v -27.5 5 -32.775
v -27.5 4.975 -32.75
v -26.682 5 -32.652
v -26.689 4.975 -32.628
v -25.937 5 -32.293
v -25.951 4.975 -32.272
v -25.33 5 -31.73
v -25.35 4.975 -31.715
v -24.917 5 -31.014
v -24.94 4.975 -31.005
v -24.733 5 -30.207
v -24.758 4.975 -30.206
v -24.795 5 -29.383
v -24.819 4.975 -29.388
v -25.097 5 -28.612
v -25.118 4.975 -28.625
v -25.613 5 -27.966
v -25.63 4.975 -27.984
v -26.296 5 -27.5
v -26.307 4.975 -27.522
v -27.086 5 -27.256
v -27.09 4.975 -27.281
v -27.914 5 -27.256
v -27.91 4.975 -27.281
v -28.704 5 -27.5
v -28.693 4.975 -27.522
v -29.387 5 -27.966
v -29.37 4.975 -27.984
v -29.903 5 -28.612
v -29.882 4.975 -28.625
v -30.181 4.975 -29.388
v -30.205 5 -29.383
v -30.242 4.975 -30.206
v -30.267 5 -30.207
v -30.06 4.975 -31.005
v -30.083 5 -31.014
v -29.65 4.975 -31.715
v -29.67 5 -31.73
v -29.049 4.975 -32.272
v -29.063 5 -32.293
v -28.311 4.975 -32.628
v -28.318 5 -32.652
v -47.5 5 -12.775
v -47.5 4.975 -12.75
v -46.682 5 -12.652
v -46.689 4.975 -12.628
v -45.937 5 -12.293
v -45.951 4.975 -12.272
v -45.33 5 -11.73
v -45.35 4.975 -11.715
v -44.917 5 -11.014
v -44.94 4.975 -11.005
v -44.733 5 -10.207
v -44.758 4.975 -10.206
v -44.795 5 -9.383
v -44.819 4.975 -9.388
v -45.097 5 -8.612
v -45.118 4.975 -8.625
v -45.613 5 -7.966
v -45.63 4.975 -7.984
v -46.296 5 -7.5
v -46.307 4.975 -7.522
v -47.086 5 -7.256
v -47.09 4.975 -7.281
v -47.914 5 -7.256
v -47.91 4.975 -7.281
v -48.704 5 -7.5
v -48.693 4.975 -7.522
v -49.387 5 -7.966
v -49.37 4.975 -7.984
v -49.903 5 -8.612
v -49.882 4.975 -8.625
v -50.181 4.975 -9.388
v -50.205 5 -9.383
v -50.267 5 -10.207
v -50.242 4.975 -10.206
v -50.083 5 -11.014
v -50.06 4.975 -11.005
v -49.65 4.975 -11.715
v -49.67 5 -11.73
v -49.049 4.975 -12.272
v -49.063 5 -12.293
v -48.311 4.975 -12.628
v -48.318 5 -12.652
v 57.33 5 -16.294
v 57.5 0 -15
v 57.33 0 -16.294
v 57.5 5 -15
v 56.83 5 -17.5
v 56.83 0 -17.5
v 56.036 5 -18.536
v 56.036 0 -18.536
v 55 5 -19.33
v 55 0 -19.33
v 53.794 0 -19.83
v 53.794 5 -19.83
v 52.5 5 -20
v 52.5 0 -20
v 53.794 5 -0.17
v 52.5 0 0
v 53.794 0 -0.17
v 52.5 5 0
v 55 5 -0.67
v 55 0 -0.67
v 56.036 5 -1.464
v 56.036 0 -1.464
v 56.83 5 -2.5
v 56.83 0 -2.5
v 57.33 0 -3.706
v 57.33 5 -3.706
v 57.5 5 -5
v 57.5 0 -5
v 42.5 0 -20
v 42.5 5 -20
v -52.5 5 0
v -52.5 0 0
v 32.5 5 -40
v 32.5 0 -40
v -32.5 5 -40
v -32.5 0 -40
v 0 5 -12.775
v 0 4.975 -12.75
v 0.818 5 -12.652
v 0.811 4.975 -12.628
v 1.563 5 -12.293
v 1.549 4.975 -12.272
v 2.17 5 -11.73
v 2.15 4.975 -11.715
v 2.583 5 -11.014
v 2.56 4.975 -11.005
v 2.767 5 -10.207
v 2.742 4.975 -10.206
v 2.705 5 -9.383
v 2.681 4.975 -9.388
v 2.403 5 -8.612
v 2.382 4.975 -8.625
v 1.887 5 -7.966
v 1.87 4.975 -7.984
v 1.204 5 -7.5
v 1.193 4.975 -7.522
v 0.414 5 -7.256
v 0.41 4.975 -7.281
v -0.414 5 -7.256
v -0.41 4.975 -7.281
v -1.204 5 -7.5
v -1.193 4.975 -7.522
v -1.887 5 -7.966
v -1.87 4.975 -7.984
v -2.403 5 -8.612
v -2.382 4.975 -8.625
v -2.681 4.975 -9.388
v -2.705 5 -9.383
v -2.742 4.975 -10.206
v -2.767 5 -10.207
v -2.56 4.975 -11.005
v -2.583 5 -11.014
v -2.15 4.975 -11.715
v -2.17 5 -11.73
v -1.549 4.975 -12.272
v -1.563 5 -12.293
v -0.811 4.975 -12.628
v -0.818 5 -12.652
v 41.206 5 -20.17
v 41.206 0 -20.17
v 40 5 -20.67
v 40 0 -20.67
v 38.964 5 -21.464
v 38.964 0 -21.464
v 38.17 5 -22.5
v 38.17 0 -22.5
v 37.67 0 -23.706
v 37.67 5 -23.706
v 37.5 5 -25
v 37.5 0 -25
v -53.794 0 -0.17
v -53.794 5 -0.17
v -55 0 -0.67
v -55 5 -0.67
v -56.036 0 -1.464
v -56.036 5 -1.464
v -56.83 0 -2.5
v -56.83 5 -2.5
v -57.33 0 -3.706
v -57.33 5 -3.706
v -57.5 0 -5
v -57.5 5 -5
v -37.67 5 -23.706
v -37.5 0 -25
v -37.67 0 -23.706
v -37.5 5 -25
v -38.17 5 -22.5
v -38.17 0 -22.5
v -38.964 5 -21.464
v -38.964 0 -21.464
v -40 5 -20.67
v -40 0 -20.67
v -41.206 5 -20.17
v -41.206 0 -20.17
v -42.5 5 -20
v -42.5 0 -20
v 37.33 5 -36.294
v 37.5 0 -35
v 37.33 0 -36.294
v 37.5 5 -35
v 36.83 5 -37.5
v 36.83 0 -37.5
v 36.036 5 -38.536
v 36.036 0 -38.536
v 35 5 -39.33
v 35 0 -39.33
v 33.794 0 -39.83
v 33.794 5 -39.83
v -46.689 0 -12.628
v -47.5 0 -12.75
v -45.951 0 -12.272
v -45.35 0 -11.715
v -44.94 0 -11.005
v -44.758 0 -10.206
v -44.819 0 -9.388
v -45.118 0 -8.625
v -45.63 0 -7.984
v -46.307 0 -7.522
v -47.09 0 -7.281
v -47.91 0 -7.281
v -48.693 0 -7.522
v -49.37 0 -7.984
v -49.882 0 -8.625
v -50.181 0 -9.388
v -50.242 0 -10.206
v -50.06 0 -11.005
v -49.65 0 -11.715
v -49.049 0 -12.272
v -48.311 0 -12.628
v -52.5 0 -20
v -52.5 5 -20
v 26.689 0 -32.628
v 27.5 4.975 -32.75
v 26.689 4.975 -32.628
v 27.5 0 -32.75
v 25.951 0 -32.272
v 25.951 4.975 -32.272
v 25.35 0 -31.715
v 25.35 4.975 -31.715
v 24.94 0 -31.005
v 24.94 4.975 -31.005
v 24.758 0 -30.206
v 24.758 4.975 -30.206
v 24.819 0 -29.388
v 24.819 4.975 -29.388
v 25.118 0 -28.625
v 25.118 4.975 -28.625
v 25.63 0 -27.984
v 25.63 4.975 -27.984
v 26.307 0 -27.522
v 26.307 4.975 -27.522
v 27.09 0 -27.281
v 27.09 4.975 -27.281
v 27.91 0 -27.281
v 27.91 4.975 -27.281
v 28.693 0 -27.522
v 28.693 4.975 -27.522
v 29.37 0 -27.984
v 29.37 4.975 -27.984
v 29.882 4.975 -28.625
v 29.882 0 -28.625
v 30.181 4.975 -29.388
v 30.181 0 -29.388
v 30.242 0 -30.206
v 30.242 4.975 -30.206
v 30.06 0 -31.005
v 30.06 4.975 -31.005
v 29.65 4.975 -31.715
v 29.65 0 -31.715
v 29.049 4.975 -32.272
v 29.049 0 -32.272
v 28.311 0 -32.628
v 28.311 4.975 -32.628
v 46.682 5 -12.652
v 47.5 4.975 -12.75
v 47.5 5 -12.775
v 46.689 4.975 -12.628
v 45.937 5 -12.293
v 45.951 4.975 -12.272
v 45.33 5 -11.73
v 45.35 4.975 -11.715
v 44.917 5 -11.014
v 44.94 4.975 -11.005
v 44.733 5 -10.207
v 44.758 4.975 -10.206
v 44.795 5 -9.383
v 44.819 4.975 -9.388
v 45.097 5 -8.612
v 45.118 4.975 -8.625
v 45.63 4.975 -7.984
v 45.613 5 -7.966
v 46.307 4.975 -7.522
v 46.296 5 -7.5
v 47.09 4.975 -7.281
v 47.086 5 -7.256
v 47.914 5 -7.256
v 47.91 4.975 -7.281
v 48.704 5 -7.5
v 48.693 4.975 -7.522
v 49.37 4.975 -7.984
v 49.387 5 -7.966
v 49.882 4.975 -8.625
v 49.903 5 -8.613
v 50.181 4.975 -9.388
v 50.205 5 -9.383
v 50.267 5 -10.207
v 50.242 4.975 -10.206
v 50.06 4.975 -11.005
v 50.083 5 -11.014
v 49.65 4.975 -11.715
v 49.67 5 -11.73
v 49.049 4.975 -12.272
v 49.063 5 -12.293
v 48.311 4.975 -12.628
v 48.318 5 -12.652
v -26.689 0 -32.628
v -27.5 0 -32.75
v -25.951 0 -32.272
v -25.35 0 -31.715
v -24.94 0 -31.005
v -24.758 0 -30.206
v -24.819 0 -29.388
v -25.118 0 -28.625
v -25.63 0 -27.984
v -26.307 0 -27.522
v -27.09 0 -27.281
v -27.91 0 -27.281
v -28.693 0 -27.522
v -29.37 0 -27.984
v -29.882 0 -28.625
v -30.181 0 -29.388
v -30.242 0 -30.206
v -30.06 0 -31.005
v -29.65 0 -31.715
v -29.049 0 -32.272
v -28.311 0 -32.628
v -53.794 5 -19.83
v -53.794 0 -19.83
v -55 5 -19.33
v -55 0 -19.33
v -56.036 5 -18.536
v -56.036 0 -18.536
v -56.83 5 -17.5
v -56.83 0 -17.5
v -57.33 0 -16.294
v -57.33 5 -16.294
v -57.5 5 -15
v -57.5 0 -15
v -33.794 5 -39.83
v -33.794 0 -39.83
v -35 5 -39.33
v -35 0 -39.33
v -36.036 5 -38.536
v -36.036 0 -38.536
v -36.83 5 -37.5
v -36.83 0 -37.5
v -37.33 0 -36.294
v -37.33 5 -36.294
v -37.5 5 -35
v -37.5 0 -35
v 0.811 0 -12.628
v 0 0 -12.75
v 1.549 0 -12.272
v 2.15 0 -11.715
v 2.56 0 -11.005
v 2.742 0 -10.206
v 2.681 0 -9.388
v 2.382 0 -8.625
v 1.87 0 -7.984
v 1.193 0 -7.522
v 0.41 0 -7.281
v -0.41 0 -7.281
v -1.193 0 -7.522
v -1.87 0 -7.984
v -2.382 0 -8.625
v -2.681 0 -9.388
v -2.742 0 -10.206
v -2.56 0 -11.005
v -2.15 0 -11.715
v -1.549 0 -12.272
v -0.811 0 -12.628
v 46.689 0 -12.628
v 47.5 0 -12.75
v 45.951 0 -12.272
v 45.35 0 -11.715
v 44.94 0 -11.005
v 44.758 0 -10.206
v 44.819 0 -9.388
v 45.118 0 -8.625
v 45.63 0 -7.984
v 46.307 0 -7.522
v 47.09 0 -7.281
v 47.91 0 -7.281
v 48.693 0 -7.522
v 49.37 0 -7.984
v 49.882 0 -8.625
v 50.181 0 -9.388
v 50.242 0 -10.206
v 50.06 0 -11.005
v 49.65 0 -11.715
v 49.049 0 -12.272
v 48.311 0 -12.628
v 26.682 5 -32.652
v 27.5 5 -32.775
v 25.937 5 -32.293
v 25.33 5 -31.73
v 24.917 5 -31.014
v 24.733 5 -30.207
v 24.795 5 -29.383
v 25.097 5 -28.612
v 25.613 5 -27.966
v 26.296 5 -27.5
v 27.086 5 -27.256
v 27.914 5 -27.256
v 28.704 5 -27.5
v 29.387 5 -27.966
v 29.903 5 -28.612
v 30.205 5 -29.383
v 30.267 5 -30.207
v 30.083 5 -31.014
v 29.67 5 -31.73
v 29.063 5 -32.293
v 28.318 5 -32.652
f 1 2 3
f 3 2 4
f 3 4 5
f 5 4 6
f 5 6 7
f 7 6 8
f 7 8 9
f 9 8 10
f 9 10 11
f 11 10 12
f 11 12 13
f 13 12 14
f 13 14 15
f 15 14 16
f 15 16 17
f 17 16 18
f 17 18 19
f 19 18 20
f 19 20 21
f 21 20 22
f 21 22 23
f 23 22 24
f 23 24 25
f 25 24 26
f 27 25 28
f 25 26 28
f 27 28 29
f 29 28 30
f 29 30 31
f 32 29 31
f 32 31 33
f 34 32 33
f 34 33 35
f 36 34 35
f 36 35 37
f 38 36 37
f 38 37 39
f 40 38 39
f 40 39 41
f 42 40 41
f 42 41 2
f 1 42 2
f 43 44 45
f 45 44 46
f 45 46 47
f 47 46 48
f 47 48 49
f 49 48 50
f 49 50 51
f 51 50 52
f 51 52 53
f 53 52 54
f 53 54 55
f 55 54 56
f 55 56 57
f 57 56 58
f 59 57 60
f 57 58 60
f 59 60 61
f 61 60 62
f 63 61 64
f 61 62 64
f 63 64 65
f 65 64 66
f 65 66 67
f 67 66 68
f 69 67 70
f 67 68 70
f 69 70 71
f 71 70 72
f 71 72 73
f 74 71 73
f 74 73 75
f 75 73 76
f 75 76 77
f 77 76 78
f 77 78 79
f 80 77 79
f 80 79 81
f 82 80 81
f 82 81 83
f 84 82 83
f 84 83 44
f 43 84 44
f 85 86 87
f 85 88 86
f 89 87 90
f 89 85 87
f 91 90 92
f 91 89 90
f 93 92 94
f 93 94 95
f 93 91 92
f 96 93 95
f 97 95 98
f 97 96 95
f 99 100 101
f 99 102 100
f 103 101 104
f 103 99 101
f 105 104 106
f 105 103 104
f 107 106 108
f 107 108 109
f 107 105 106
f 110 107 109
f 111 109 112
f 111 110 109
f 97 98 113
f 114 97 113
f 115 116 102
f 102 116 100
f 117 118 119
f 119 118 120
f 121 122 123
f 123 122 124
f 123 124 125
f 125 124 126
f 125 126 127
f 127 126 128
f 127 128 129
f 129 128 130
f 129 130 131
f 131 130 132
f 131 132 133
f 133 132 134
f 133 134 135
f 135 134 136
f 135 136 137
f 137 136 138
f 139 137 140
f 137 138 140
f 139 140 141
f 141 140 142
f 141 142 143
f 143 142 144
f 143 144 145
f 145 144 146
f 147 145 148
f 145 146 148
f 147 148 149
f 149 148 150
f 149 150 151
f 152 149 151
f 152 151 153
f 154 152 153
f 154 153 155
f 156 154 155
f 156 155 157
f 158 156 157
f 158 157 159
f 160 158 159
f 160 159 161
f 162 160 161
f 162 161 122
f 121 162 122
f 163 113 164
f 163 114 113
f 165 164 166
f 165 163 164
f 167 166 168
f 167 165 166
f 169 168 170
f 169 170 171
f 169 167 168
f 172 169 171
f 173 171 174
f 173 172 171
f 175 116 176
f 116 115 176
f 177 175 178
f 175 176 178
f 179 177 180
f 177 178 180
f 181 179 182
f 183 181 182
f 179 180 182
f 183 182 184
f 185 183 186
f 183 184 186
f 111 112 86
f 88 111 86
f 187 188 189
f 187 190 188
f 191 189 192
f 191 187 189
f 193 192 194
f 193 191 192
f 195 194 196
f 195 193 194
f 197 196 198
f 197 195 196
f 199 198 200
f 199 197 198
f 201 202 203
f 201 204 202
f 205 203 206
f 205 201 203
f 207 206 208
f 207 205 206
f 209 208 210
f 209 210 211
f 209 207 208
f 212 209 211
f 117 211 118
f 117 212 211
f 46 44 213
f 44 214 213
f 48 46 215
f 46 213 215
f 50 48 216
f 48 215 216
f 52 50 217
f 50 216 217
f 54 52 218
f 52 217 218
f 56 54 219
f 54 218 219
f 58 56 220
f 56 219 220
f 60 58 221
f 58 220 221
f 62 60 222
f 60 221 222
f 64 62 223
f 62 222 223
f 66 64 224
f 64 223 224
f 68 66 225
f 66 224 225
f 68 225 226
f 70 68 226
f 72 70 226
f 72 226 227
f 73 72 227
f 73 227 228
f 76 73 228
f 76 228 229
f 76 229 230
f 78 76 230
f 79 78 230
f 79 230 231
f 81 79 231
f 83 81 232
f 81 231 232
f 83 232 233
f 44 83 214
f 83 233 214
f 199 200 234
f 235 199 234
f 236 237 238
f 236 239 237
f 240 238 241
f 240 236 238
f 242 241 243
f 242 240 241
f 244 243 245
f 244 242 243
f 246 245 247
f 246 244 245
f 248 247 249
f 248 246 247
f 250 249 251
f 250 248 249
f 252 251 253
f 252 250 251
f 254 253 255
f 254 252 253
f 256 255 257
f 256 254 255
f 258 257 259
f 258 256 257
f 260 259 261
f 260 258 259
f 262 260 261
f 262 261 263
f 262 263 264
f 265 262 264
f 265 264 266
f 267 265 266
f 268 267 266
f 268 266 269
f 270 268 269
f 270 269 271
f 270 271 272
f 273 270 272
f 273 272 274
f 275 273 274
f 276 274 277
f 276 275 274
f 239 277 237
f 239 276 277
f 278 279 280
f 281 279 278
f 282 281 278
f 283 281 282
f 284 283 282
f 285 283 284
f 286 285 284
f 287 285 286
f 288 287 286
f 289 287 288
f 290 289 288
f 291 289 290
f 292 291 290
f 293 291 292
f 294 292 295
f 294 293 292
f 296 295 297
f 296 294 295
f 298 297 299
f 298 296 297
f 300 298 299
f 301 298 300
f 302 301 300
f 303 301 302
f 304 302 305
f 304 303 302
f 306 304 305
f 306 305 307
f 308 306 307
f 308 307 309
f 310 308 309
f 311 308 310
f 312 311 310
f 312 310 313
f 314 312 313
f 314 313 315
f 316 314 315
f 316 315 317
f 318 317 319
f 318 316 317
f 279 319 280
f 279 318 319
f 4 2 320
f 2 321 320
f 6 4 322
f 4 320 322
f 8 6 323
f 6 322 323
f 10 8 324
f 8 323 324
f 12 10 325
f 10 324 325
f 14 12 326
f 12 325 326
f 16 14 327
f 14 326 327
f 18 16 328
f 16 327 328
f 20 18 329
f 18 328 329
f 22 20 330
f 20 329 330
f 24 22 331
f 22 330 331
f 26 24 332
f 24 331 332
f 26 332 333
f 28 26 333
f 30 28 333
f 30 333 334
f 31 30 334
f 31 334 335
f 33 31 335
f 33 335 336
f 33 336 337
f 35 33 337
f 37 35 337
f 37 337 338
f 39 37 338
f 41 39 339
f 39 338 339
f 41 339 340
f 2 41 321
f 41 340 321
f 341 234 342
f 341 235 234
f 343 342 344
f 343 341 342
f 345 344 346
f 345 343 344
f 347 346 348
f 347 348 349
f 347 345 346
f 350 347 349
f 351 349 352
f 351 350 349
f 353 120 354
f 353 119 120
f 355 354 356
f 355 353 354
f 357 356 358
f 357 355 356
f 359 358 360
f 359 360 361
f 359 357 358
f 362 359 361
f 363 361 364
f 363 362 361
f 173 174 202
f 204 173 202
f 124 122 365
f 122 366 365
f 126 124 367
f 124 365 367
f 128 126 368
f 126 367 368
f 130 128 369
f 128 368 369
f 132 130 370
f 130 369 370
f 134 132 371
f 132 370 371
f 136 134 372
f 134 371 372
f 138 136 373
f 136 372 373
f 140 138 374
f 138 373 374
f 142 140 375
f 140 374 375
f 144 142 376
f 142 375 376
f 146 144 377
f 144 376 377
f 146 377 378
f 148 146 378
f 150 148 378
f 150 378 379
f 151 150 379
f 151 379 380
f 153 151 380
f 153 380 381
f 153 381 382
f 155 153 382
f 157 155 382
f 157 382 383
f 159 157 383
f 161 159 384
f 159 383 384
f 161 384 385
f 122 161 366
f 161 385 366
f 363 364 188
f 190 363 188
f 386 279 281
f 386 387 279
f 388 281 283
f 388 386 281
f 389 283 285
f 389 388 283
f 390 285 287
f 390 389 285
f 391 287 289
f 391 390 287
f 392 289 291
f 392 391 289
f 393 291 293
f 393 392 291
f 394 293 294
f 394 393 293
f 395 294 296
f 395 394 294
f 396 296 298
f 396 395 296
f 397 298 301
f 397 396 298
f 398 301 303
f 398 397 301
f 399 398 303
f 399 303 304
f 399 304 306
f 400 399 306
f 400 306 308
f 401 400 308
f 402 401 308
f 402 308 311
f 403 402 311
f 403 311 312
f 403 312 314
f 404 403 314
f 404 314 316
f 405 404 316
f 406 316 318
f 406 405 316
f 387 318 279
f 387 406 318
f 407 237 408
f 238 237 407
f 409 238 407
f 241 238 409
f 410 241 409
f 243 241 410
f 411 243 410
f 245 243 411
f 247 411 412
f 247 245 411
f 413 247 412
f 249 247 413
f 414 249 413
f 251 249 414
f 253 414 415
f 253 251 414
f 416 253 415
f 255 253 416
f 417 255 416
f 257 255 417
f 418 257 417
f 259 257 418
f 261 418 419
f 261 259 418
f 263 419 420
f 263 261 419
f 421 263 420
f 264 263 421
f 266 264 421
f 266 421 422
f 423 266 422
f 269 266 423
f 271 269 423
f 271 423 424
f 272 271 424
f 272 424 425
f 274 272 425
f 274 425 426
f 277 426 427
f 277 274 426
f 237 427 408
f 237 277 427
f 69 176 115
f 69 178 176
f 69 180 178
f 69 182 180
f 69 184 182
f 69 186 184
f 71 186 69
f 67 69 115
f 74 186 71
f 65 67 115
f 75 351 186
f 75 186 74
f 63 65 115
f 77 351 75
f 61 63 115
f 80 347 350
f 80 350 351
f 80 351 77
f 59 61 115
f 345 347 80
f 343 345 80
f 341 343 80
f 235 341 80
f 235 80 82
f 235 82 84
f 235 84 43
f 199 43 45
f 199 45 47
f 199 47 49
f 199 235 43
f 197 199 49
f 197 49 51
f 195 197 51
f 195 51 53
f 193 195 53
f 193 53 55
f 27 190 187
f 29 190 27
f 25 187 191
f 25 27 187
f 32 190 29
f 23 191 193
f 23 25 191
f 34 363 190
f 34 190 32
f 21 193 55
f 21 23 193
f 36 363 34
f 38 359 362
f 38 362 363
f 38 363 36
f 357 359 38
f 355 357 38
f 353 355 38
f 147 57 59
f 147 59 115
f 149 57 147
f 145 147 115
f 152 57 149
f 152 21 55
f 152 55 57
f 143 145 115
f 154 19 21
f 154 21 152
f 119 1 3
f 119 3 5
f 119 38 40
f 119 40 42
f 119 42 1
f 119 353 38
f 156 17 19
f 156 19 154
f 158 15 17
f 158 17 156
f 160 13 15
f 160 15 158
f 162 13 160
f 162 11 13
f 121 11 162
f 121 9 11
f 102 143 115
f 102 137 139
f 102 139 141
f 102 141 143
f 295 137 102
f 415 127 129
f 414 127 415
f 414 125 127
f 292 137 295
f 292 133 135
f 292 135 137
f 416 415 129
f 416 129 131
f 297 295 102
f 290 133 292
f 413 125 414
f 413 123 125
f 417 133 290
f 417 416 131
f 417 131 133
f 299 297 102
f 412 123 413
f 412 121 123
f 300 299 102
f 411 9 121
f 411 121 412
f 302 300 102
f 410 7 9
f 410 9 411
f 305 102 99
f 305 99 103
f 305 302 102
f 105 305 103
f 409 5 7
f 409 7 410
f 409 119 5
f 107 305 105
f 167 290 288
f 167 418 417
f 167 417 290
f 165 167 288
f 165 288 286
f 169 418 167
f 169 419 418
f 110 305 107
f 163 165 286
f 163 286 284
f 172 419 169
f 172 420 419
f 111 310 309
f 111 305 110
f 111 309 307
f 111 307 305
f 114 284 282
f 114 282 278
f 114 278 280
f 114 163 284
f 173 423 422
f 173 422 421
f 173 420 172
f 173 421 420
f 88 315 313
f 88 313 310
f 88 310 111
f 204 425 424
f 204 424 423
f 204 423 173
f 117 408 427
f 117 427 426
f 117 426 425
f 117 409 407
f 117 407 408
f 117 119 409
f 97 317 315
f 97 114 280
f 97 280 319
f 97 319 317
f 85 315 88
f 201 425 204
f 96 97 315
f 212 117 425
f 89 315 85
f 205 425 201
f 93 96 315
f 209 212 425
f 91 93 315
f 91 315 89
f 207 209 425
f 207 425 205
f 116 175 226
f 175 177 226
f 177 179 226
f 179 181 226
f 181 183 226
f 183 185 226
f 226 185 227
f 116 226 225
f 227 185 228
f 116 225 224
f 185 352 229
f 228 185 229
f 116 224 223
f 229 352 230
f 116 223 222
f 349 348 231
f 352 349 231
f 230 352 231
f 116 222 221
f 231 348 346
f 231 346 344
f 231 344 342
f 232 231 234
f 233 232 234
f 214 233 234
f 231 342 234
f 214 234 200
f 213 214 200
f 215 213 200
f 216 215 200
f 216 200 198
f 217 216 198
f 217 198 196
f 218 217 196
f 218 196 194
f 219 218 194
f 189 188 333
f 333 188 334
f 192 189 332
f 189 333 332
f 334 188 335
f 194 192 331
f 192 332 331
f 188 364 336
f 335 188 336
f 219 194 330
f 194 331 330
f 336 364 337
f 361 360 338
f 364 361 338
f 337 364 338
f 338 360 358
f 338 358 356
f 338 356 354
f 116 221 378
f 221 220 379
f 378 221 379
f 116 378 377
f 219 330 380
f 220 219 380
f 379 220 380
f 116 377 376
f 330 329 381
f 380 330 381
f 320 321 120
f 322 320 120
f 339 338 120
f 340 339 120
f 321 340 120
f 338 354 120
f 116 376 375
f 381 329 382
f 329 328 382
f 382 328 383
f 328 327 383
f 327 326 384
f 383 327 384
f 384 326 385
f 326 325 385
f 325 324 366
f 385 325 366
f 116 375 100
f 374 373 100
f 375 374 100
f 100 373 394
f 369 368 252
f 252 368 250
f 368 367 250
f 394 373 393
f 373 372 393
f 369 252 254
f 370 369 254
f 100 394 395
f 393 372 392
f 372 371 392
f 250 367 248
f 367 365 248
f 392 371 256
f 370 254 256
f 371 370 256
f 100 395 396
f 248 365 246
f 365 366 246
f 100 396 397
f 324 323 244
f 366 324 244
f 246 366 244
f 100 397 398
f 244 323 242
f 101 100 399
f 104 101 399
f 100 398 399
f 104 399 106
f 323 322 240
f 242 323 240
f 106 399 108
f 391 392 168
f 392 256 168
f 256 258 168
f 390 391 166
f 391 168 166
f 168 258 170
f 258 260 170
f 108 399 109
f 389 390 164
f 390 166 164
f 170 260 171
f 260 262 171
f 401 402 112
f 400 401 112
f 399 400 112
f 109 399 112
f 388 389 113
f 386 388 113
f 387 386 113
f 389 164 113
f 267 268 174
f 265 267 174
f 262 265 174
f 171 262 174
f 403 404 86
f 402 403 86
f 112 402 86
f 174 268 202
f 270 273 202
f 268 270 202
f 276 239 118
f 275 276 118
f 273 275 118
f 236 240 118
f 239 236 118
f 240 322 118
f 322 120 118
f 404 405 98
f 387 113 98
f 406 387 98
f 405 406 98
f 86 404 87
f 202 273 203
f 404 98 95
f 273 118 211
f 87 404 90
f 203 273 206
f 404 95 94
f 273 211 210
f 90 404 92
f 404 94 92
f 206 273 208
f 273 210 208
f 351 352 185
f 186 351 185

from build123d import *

# Parameters (mm, degrees)
BOSS_EXTRUDE1_DEPTH            = 5
FILLET2_R                      = 5
M5_CLEARANCE_HOLE1_D           = 5.5
M5_CLEARANCE_HOLE1_CSINK_D     = 5.55
M5_CLEARANCE_HOLE1_CSINK_ANGLE = 90
M5_CLEARANCE_HOLE2_D           = 5.5
M5_CLEARANCE_HOLE2_CSINK_D     = 5.55
M5_CLEARANCE_HOLE2_CSINK_ANGLE = 90
M5_CLEARANCE_HOLE3_D           = 5.5
M5_CLEARANCE_HOLE3_CSINK_D     = 5.55
M5_CLEARANCE_HOLE3_CSINK_ANGLE = 90


with BuildPart() as part:
    # Sketch2 → Boss-Extrude1 (new body)
    with BuildSketch(Plane(origin=(0, 0, 0), x_dir=(1, 0, 0), z_dir=(0, 1, 0))):
        Polygon((-57.5, 0), (57.5, 0), (57.5, 20), (37.5, 20), (37.5, 40), (-37.5, 40), (-37.5, 20), (-57.5, 20), align=None)
    extrude(amount=BOSS_EXTRUDE1_DEPTH)

    # Fillet2
    fillet2_edges = [part.edges().sort_by_distance(p)[0] for p in [
        (37.5, 2.5, -20),
        (57.5, 2.5, -20),
        (57.5, 2.5, 0),
        (-57.5, 2.5, 0),
        (-57.5, 2.5, -20),
        (-37.5, 2.5, -20),
        (-37.5, 2.5, -40),
        (37.5, 2.5, -40),
    ]]
    fillet(fillet2_edges, radius=FILLET2_R)

    # M5 Clearance Hole1 (through all)
    with Locations(Plane(origin=(-27.5, 5, -30), x_dir=(0, 0, 1), z_dir=(0, 1, 0))):
        with Locations((0, 0)):
            m5_clearance_hole1 = CounterSinkHole(M5_CLEARANCE_HOLE1_D / 2, M5_CLEARANCE_HOLE1_CSINK_D / 2, counter_sink_angle=M5_CLEARANCE_HOLE1_CSINK_ANGLE)

    # Mirror1: M5 Clearance Hole1 across plane
    add(m5_clearance_hole1.mirror(Plane(origin=(0, 0, 0), x_dir=(0, 0, 1), z_dir=(1, 0, 0))), mode=Mode.SUBTRACT)

    # M5 Clearance Hole2 (through all)
    with Locations(Plane(origin=(-47.5, 5, -10), x_dir=(0, 0, 1), z_dir=(0, 1, 0))):
        with Locations((0, 0)):
            m5_clearance_hole2 = CounterSinkHole(M5_CLEARANCE_HOLE2_D / 2, M5_CLEARANCE_HOLE2_CSINK_D / 2, counter_sink_angle=M5_CLEARANCE_HOLE2_CSINK_ANGLE)

    # Mirror2: M5 Clearance Hole2 across plane
    add(m5_clearance_hole2.mirror(Plane(origin=(0, 0, 0), x_dir=(0, 0, 1), z_dir=(1, 0, 0))), mode=Mode.SUBTRACT)

    # M5 Clearance Hole3 (through all)
    with Locations(Plane(origin=(0, 5, -10), x_dir=(0, 0, 1), z_dir=(0, 1, 0))):
        with Locations((0, 0)):
            CounterSinkHole(M5_CLEARANCE_HOLE3_D / 2, M5_CLEARANCE_HOLE3_CSINK_D / 2, counter_sink_angle=M5_CLEARANCE_HOLE3_CSINK_ANGLE)


solid = part.part
